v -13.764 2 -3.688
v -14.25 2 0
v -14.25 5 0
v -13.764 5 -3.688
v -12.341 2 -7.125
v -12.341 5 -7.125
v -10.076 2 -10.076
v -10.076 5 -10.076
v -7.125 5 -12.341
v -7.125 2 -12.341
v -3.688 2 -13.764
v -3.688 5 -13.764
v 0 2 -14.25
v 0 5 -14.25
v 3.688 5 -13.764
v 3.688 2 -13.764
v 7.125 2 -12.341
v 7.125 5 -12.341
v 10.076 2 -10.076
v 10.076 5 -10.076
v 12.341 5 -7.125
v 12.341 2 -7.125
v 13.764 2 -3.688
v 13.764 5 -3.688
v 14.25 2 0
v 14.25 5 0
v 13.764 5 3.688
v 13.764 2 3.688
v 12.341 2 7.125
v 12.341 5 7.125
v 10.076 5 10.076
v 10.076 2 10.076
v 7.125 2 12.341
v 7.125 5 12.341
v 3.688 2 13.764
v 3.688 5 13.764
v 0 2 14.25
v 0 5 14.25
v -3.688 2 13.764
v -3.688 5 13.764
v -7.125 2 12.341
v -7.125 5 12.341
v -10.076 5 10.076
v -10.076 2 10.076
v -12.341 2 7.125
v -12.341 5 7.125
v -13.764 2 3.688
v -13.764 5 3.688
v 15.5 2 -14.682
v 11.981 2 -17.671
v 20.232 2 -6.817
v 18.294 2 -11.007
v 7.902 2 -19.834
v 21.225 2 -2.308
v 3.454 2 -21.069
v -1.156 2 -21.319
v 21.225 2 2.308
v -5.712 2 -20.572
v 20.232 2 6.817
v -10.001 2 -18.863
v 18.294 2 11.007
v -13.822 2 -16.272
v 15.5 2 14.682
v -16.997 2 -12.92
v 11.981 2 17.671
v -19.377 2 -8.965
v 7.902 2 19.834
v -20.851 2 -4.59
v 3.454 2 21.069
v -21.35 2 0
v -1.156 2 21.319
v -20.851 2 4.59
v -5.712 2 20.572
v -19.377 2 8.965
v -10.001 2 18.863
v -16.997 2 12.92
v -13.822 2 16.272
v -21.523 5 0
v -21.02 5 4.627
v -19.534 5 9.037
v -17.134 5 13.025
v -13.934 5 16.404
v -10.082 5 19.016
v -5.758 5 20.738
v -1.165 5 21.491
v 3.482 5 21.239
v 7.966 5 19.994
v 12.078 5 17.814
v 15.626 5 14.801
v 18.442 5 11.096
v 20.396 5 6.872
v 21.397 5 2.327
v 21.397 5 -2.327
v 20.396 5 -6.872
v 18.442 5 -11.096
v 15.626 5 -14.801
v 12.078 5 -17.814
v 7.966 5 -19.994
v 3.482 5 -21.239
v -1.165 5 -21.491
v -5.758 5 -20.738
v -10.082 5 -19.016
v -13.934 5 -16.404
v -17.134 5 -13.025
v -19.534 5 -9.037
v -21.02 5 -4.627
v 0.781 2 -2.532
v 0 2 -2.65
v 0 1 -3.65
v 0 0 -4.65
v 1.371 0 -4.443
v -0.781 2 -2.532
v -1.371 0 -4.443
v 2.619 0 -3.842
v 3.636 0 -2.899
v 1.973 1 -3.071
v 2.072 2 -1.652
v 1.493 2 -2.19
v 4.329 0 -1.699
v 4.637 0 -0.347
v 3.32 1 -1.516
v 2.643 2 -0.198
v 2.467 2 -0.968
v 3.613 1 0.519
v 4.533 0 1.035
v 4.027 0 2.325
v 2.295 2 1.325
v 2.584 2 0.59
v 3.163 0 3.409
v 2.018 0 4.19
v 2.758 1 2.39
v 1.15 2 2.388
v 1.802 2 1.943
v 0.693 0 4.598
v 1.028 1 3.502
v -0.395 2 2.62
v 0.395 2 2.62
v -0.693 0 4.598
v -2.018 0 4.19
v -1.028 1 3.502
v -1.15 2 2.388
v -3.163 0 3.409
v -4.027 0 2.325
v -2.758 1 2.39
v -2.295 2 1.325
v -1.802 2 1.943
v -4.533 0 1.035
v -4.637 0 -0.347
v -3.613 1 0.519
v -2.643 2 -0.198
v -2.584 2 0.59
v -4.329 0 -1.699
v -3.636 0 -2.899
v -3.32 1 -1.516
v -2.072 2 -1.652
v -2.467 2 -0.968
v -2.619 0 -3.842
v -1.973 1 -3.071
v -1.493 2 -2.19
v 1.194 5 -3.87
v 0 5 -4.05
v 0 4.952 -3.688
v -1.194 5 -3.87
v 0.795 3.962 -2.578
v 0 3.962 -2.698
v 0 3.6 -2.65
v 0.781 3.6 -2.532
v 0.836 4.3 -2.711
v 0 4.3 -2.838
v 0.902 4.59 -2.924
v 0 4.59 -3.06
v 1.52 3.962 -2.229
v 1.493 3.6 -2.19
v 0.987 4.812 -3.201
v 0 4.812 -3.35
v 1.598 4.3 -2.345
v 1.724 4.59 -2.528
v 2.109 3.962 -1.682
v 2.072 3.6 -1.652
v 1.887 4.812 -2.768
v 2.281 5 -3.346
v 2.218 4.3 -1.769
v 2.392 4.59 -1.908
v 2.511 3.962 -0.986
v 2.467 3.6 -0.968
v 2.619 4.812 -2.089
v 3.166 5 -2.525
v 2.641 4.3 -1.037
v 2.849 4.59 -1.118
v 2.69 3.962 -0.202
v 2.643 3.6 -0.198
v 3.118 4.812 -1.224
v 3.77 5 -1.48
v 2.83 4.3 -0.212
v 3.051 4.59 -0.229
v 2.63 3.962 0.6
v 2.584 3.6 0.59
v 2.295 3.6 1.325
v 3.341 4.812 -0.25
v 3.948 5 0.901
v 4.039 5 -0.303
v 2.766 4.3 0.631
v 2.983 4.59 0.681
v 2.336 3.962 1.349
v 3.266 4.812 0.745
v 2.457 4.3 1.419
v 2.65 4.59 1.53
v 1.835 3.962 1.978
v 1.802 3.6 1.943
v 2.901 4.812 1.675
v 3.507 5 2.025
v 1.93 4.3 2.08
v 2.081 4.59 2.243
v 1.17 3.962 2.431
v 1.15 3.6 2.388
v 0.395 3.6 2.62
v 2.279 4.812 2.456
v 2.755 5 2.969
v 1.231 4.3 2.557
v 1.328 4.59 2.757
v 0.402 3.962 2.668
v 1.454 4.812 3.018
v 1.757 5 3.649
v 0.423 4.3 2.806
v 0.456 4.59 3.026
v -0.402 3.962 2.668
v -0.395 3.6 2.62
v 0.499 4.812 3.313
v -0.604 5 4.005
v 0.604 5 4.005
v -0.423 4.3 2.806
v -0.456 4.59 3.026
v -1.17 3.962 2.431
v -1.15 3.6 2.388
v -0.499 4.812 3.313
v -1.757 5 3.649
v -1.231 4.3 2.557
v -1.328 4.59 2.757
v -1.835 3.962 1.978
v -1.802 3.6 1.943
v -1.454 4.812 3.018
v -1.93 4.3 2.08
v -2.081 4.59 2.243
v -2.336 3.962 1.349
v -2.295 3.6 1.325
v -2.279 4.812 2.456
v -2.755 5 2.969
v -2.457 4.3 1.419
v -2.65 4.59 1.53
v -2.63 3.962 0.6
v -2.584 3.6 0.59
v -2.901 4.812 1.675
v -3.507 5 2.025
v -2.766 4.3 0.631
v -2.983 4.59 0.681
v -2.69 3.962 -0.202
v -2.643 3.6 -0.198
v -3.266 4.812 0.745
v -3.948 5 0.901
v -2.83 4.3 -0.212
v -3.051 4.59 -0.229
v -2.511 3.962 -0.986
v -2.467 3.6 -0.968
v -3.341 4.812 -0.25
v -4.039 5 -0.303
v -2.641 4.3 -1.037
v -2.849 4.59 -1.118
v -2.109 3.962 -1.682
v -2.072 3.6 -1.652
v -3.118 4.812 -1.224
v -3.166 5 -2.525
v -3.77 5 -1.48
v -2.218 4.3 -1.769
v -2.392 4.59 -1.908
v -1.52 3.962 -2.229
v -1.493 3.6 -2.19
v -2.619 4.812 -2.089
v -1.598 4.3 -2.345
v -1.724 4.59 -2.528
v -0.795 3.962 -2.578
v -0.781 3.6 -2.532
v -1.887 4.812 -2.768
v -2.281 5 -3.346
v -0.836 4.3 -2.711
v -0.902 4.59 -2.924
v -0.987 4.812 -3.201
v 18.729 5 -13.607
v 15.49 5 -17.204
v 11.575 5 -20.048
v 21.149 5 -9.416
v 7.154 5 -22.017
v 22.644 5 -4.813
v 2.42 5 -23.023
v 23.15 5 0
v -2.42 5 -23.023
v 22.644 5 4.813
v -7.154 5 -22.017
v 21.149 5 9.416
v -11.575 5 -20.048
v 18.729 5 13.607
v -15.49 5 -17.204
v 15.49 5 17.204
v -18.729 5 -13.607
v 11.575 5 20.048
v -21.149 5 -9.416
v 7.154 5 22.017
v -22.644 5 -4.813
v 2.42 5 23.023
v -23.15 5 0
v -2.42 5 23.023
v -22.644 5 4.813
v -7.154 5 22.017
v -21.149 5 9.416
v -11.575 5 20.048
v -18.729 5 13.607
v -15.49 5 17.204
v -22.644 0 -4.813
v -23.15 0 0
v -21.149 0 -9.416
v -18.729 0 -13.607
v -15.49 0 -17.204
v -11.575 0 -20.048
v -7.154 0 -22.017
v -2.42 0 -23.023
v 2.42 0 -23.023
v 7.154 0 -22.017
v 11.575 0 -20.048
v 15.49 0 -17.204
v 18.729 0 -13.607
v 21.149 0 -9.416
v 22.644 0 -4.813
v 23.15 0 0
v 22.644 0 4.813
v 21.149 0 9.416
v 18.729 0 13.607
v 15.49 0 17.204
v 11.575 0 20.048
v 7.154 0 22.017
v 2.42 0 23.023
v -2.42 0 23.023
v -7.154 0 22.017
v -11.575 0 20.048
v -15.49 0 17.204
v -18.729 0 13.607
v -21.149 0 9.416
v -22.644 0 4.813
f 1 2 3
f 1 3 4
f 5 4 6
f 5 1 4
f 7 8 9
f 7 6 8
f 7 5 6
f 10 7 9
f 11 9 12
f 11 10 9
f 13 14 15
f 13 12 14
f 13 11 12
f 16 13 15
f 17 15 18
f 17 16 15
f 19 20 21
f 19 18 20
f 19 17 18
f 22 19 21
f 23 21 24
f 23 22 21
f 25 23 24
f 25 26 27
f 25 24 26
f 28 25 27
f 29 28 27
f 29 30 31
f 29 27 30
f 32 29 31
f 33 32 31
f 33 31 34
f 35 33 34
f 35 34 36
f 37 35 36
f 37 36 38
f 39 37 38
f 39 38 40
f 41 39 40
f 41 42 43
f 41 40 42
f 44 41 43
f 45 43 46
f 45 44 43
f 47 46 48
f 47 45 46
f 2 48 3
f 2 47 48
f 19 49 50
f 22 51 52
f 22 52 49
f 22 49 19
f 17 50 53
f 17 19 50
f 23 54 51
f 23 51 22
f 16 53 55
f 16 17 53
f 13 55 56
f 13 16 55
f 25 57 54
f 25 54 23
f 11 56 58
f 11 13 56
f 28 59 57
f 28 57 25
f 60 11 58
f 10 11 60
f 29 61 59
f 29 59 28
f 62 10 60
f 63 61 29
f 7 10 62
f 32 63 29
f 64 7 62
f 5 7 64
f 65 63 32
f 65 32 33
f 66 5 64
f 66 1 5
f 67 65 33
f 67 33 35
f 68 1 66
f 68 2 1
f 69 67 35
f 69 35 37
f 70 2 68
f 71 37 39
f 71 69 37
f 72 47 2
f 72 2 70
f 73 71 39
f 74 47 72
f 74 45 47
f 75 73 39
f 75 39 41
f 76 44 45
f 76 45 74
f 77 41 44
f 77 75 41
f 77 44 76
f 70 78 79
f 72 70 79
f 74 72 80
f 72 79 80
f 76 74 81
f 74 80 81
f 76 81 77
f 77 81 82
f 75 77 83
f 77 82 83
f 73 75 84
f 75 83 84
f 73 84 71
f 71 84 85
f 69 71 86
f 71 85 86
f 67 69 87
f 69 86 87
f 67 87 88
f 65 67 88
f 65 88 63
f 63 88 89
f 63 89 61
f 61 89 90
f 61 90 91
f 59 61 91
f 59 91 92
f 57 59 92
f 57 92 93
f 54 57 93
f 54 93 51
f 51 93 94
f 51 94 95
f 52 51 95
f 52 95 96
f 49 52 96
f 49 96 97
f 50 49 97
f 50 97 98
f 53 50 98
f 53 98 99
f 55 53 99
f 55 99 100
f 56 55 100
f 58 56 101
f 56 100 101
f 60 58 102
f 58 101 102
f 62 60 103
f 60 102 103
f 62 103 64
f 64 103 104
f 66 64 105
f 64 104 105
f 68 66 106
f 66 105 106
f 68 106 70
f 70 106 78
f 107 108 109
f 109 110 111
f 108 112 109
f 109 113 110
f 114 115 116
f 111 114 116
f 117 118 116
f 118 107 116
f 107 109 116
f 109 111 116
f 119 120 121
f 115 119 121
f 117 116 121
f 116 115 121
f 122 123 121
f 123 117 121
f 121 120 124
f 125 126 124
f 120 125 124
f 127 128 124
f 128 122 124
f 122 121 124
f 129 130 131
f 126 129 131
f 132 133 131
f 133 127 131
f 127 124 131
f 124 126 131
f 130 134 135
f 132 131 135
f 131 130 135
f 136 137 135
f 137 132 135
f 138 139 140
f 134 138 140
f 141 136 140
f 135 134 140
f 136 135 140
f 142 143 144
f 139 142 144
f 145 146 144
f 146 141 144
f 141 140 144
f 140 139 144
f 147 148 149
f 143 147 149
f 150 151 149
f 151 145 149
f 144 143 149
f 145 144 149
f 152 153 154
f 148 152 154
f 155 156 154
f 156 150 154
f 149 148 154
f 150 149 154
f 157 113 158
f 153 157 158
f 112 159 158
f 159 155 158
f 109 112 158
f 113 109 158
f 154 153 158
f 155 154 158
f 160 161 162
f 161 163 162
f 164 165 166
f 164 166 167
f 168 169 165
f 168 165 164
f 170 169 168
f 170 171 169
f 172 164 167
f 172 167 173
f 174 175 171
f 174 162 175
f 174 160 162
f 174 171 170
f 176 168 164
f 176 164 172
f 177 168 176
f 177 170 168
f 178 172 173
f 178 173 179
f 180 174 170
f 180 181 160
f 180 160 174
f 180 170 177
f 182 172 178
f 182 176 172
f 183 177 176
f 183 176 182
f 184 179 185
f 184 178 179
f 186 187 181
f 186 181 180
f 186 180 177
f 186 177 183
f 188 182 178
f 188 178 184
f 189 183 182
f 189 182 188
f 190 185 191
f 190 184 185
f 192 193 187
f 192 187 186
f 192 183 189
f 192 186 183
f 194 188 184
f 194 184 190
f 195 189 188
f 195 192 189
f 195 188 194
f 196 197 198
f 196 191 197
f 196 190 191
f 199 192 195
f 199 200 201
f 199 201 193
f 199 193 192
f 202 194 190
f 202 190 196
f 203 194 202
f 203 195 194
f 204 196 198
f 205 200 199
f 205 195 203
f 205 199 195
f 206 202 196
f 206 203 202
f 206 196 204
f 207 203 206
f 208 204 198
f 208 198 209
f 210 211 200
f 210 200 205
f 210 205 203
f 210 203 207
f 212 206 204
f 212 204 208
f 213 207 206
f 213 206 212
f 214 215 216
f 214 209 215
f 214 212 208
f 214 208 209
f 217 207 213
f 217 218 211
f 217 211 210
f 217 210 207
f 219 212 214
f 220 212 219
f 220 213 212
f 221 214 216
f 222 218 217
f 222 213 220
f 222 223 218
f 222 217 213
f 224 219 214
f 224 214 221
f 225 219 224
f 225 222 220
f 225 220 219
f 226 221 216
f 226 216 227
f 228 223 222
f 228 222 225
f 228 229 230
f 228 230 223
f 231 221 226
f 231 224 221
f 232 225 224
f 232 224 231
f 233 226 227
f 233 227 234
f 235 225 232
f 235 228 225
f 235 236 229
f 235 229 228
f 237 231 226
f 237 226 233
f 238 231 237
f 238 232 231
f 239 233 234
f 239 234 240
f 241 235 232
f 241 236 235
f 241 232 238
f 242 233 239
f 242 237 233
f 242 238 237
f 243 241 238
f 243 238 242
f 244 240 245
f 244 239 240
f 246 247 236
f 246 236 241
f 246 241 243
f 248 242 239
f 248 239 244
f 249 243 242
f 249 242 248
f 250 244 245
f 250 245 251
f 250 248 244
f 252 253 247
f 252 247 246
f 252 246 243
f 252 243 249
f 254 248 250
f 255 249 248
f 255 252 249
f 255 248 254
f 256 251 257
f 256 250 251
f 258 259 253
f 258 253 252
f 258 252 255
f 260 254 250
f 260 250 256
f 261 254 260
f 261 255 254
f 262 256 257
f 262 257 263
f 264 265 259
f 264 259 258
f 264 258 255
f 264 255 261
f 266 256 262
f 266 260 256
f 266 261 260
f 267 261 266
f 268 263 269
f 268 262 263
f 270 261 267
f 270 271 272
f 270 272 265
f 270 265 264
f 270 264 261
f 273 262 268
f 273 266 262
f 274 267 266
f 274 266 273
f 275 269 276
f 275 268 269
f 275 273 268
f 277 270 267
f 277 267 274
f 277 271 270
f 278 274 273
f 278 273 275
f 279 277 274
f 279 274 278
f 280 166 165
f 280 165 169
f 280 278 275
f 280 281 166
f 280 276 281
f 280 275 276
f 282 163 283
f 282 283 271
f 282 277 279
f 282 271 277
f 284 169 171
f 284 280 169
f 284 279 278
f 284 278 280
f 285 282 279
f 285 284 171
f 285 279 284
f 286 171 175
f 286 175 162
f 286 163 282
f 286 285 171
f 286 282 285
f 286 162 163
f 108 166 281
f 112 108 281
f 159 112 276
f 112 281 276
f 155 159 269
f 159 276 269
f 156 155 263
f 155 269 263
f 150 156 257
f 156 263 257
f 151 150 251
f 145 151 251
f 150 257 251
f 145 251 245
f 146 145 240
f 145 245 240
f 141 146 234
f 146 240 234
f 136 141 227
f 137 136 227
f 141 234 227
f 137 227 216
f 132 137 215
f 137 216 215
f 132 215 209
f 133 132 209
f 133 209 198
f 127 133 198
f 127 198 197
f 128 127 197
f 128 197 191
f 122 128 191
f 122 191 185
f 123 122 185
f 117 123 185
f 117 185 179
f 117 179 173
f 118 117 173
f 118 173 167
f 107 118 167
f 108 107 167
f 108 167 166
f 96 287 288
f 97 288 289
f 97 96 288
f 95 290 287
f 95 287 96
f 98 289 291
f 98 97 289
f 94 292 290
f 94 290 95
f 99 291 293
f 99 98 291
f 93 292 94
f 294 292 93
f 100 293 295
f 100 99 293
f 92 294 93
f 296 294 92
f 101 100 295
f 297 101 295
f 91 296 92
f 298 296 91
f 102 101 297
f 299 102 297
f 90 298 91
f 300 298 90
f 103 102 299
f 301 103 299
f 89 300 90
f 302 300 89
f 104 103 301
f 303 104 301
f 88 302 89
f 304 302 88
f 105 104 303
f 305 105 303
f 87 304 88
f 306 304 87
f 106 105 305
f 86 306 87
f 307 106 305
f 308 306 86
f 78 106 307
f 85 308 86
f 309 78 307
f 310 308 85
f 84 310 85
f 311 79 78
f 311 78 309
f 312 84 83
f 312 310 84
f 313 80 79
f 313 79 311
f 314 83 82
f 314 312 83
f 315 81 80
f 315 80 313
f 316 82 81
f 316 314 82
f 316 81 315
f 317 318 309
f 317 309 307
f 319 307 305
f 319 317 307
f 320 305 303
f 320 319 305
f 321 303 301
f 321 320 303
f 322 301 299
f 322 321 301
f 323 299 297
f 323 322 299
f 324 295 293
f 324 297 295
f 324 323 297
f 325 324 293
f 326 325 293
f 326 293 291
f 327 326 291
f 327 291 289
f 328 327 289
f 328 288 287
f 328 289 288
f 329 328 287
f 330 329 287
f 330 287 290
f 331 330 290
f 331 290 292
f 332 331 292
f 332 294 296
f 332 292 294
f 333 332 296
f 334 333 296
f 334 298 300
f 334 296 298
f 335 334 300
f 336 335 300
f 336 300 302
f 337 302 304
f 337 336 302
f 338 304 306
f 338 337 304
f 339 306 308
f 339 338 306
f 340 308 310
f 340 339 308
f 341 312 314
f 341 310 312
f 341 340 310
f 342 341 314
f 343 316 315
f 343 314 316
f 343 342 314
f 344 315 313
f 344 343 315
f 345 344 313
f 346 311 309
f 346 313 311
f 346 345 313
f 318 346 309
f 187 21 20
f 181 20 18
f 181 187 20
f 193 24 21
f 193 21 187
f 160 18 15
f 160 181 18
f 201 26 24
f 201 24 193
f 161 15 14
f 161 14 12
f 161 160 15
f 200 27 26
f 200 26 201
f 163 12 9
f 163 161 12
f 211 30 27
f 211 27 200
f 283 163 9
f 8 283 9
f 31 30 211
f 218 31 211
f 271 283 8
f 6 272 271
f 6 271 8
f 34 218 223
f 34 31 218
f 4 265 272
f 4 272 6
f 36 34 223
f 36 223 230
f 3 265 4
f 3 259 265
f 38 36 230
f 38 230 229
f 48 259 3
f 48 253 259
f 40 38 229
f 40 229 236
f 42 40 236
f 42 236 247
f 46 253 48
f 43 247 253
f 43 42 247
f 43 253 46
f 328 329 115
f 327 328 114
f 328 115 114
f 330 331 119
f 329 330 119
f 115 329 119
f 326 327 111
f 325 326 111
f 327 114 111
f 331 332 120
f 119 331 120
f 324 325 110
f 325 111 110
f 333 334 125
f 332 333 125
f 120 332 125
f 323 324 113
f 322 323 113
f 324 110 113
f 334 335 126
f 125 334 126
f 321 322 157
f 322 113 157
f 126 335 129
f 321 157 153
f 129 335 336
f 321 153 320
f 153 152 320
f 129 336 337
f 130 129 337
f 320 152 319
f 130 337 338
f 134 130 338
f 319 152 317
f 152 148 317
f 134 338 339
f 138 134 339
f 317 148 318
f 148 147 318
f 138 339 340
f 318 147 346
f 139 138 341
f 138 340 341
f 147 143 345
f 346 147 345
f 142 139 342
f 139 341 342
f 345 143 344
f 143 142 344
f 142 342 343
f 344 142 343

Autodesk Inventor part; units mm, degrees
ref_plane "YZ Plane" through (0, 0, 0) normal (1, 0, 0) x (0, 1, 0)
ref_plane "XZ Plane" through (0, 0, 0) normal (0, 1, 0) x (-1, 0, 0)
ref_plane "XY Plane" through (0, 0, 0) normal (0, 0, 1) x (1, 0, 0)
sketch "Sketch1" plane through (0, 0, 0) normal (0, 1, 0) x (-1, 0, 0)
  circle A0 centre (0, 0) radius 21.35
  circle A1 centre (0, 0) radius 14.25
  circle A2 centre (0, 0) radius 23.15
  dimension "d0" = 42.7
  dimension "d1" = 28.5
  dimension "d3" = 1.8
extrude "Extrusion1" add sketch "Sketch1" along normal blind 5
extrude "Extrusion2" add sketch "Sketch1" along normal blind 2 contours A0
draft "FaceDraft1" angle 3.3 pull direction (0, 1, 0) faces at (-21.0735, 4, -3.4248) fixed edges at (21.35, 2, 0)
hole "Hole1" at (0, 0, 0) direction (0, 1, 0) diameter 5.3 end through all
chamfer "Chamfer1" distance 2 angle 45 1 edges at (0, 0, 2.65)
fillet "Fillet1" radius 1.4 1 edges at (0, 5, 2.65)
properties part number "Cap V2 (App V5)"
